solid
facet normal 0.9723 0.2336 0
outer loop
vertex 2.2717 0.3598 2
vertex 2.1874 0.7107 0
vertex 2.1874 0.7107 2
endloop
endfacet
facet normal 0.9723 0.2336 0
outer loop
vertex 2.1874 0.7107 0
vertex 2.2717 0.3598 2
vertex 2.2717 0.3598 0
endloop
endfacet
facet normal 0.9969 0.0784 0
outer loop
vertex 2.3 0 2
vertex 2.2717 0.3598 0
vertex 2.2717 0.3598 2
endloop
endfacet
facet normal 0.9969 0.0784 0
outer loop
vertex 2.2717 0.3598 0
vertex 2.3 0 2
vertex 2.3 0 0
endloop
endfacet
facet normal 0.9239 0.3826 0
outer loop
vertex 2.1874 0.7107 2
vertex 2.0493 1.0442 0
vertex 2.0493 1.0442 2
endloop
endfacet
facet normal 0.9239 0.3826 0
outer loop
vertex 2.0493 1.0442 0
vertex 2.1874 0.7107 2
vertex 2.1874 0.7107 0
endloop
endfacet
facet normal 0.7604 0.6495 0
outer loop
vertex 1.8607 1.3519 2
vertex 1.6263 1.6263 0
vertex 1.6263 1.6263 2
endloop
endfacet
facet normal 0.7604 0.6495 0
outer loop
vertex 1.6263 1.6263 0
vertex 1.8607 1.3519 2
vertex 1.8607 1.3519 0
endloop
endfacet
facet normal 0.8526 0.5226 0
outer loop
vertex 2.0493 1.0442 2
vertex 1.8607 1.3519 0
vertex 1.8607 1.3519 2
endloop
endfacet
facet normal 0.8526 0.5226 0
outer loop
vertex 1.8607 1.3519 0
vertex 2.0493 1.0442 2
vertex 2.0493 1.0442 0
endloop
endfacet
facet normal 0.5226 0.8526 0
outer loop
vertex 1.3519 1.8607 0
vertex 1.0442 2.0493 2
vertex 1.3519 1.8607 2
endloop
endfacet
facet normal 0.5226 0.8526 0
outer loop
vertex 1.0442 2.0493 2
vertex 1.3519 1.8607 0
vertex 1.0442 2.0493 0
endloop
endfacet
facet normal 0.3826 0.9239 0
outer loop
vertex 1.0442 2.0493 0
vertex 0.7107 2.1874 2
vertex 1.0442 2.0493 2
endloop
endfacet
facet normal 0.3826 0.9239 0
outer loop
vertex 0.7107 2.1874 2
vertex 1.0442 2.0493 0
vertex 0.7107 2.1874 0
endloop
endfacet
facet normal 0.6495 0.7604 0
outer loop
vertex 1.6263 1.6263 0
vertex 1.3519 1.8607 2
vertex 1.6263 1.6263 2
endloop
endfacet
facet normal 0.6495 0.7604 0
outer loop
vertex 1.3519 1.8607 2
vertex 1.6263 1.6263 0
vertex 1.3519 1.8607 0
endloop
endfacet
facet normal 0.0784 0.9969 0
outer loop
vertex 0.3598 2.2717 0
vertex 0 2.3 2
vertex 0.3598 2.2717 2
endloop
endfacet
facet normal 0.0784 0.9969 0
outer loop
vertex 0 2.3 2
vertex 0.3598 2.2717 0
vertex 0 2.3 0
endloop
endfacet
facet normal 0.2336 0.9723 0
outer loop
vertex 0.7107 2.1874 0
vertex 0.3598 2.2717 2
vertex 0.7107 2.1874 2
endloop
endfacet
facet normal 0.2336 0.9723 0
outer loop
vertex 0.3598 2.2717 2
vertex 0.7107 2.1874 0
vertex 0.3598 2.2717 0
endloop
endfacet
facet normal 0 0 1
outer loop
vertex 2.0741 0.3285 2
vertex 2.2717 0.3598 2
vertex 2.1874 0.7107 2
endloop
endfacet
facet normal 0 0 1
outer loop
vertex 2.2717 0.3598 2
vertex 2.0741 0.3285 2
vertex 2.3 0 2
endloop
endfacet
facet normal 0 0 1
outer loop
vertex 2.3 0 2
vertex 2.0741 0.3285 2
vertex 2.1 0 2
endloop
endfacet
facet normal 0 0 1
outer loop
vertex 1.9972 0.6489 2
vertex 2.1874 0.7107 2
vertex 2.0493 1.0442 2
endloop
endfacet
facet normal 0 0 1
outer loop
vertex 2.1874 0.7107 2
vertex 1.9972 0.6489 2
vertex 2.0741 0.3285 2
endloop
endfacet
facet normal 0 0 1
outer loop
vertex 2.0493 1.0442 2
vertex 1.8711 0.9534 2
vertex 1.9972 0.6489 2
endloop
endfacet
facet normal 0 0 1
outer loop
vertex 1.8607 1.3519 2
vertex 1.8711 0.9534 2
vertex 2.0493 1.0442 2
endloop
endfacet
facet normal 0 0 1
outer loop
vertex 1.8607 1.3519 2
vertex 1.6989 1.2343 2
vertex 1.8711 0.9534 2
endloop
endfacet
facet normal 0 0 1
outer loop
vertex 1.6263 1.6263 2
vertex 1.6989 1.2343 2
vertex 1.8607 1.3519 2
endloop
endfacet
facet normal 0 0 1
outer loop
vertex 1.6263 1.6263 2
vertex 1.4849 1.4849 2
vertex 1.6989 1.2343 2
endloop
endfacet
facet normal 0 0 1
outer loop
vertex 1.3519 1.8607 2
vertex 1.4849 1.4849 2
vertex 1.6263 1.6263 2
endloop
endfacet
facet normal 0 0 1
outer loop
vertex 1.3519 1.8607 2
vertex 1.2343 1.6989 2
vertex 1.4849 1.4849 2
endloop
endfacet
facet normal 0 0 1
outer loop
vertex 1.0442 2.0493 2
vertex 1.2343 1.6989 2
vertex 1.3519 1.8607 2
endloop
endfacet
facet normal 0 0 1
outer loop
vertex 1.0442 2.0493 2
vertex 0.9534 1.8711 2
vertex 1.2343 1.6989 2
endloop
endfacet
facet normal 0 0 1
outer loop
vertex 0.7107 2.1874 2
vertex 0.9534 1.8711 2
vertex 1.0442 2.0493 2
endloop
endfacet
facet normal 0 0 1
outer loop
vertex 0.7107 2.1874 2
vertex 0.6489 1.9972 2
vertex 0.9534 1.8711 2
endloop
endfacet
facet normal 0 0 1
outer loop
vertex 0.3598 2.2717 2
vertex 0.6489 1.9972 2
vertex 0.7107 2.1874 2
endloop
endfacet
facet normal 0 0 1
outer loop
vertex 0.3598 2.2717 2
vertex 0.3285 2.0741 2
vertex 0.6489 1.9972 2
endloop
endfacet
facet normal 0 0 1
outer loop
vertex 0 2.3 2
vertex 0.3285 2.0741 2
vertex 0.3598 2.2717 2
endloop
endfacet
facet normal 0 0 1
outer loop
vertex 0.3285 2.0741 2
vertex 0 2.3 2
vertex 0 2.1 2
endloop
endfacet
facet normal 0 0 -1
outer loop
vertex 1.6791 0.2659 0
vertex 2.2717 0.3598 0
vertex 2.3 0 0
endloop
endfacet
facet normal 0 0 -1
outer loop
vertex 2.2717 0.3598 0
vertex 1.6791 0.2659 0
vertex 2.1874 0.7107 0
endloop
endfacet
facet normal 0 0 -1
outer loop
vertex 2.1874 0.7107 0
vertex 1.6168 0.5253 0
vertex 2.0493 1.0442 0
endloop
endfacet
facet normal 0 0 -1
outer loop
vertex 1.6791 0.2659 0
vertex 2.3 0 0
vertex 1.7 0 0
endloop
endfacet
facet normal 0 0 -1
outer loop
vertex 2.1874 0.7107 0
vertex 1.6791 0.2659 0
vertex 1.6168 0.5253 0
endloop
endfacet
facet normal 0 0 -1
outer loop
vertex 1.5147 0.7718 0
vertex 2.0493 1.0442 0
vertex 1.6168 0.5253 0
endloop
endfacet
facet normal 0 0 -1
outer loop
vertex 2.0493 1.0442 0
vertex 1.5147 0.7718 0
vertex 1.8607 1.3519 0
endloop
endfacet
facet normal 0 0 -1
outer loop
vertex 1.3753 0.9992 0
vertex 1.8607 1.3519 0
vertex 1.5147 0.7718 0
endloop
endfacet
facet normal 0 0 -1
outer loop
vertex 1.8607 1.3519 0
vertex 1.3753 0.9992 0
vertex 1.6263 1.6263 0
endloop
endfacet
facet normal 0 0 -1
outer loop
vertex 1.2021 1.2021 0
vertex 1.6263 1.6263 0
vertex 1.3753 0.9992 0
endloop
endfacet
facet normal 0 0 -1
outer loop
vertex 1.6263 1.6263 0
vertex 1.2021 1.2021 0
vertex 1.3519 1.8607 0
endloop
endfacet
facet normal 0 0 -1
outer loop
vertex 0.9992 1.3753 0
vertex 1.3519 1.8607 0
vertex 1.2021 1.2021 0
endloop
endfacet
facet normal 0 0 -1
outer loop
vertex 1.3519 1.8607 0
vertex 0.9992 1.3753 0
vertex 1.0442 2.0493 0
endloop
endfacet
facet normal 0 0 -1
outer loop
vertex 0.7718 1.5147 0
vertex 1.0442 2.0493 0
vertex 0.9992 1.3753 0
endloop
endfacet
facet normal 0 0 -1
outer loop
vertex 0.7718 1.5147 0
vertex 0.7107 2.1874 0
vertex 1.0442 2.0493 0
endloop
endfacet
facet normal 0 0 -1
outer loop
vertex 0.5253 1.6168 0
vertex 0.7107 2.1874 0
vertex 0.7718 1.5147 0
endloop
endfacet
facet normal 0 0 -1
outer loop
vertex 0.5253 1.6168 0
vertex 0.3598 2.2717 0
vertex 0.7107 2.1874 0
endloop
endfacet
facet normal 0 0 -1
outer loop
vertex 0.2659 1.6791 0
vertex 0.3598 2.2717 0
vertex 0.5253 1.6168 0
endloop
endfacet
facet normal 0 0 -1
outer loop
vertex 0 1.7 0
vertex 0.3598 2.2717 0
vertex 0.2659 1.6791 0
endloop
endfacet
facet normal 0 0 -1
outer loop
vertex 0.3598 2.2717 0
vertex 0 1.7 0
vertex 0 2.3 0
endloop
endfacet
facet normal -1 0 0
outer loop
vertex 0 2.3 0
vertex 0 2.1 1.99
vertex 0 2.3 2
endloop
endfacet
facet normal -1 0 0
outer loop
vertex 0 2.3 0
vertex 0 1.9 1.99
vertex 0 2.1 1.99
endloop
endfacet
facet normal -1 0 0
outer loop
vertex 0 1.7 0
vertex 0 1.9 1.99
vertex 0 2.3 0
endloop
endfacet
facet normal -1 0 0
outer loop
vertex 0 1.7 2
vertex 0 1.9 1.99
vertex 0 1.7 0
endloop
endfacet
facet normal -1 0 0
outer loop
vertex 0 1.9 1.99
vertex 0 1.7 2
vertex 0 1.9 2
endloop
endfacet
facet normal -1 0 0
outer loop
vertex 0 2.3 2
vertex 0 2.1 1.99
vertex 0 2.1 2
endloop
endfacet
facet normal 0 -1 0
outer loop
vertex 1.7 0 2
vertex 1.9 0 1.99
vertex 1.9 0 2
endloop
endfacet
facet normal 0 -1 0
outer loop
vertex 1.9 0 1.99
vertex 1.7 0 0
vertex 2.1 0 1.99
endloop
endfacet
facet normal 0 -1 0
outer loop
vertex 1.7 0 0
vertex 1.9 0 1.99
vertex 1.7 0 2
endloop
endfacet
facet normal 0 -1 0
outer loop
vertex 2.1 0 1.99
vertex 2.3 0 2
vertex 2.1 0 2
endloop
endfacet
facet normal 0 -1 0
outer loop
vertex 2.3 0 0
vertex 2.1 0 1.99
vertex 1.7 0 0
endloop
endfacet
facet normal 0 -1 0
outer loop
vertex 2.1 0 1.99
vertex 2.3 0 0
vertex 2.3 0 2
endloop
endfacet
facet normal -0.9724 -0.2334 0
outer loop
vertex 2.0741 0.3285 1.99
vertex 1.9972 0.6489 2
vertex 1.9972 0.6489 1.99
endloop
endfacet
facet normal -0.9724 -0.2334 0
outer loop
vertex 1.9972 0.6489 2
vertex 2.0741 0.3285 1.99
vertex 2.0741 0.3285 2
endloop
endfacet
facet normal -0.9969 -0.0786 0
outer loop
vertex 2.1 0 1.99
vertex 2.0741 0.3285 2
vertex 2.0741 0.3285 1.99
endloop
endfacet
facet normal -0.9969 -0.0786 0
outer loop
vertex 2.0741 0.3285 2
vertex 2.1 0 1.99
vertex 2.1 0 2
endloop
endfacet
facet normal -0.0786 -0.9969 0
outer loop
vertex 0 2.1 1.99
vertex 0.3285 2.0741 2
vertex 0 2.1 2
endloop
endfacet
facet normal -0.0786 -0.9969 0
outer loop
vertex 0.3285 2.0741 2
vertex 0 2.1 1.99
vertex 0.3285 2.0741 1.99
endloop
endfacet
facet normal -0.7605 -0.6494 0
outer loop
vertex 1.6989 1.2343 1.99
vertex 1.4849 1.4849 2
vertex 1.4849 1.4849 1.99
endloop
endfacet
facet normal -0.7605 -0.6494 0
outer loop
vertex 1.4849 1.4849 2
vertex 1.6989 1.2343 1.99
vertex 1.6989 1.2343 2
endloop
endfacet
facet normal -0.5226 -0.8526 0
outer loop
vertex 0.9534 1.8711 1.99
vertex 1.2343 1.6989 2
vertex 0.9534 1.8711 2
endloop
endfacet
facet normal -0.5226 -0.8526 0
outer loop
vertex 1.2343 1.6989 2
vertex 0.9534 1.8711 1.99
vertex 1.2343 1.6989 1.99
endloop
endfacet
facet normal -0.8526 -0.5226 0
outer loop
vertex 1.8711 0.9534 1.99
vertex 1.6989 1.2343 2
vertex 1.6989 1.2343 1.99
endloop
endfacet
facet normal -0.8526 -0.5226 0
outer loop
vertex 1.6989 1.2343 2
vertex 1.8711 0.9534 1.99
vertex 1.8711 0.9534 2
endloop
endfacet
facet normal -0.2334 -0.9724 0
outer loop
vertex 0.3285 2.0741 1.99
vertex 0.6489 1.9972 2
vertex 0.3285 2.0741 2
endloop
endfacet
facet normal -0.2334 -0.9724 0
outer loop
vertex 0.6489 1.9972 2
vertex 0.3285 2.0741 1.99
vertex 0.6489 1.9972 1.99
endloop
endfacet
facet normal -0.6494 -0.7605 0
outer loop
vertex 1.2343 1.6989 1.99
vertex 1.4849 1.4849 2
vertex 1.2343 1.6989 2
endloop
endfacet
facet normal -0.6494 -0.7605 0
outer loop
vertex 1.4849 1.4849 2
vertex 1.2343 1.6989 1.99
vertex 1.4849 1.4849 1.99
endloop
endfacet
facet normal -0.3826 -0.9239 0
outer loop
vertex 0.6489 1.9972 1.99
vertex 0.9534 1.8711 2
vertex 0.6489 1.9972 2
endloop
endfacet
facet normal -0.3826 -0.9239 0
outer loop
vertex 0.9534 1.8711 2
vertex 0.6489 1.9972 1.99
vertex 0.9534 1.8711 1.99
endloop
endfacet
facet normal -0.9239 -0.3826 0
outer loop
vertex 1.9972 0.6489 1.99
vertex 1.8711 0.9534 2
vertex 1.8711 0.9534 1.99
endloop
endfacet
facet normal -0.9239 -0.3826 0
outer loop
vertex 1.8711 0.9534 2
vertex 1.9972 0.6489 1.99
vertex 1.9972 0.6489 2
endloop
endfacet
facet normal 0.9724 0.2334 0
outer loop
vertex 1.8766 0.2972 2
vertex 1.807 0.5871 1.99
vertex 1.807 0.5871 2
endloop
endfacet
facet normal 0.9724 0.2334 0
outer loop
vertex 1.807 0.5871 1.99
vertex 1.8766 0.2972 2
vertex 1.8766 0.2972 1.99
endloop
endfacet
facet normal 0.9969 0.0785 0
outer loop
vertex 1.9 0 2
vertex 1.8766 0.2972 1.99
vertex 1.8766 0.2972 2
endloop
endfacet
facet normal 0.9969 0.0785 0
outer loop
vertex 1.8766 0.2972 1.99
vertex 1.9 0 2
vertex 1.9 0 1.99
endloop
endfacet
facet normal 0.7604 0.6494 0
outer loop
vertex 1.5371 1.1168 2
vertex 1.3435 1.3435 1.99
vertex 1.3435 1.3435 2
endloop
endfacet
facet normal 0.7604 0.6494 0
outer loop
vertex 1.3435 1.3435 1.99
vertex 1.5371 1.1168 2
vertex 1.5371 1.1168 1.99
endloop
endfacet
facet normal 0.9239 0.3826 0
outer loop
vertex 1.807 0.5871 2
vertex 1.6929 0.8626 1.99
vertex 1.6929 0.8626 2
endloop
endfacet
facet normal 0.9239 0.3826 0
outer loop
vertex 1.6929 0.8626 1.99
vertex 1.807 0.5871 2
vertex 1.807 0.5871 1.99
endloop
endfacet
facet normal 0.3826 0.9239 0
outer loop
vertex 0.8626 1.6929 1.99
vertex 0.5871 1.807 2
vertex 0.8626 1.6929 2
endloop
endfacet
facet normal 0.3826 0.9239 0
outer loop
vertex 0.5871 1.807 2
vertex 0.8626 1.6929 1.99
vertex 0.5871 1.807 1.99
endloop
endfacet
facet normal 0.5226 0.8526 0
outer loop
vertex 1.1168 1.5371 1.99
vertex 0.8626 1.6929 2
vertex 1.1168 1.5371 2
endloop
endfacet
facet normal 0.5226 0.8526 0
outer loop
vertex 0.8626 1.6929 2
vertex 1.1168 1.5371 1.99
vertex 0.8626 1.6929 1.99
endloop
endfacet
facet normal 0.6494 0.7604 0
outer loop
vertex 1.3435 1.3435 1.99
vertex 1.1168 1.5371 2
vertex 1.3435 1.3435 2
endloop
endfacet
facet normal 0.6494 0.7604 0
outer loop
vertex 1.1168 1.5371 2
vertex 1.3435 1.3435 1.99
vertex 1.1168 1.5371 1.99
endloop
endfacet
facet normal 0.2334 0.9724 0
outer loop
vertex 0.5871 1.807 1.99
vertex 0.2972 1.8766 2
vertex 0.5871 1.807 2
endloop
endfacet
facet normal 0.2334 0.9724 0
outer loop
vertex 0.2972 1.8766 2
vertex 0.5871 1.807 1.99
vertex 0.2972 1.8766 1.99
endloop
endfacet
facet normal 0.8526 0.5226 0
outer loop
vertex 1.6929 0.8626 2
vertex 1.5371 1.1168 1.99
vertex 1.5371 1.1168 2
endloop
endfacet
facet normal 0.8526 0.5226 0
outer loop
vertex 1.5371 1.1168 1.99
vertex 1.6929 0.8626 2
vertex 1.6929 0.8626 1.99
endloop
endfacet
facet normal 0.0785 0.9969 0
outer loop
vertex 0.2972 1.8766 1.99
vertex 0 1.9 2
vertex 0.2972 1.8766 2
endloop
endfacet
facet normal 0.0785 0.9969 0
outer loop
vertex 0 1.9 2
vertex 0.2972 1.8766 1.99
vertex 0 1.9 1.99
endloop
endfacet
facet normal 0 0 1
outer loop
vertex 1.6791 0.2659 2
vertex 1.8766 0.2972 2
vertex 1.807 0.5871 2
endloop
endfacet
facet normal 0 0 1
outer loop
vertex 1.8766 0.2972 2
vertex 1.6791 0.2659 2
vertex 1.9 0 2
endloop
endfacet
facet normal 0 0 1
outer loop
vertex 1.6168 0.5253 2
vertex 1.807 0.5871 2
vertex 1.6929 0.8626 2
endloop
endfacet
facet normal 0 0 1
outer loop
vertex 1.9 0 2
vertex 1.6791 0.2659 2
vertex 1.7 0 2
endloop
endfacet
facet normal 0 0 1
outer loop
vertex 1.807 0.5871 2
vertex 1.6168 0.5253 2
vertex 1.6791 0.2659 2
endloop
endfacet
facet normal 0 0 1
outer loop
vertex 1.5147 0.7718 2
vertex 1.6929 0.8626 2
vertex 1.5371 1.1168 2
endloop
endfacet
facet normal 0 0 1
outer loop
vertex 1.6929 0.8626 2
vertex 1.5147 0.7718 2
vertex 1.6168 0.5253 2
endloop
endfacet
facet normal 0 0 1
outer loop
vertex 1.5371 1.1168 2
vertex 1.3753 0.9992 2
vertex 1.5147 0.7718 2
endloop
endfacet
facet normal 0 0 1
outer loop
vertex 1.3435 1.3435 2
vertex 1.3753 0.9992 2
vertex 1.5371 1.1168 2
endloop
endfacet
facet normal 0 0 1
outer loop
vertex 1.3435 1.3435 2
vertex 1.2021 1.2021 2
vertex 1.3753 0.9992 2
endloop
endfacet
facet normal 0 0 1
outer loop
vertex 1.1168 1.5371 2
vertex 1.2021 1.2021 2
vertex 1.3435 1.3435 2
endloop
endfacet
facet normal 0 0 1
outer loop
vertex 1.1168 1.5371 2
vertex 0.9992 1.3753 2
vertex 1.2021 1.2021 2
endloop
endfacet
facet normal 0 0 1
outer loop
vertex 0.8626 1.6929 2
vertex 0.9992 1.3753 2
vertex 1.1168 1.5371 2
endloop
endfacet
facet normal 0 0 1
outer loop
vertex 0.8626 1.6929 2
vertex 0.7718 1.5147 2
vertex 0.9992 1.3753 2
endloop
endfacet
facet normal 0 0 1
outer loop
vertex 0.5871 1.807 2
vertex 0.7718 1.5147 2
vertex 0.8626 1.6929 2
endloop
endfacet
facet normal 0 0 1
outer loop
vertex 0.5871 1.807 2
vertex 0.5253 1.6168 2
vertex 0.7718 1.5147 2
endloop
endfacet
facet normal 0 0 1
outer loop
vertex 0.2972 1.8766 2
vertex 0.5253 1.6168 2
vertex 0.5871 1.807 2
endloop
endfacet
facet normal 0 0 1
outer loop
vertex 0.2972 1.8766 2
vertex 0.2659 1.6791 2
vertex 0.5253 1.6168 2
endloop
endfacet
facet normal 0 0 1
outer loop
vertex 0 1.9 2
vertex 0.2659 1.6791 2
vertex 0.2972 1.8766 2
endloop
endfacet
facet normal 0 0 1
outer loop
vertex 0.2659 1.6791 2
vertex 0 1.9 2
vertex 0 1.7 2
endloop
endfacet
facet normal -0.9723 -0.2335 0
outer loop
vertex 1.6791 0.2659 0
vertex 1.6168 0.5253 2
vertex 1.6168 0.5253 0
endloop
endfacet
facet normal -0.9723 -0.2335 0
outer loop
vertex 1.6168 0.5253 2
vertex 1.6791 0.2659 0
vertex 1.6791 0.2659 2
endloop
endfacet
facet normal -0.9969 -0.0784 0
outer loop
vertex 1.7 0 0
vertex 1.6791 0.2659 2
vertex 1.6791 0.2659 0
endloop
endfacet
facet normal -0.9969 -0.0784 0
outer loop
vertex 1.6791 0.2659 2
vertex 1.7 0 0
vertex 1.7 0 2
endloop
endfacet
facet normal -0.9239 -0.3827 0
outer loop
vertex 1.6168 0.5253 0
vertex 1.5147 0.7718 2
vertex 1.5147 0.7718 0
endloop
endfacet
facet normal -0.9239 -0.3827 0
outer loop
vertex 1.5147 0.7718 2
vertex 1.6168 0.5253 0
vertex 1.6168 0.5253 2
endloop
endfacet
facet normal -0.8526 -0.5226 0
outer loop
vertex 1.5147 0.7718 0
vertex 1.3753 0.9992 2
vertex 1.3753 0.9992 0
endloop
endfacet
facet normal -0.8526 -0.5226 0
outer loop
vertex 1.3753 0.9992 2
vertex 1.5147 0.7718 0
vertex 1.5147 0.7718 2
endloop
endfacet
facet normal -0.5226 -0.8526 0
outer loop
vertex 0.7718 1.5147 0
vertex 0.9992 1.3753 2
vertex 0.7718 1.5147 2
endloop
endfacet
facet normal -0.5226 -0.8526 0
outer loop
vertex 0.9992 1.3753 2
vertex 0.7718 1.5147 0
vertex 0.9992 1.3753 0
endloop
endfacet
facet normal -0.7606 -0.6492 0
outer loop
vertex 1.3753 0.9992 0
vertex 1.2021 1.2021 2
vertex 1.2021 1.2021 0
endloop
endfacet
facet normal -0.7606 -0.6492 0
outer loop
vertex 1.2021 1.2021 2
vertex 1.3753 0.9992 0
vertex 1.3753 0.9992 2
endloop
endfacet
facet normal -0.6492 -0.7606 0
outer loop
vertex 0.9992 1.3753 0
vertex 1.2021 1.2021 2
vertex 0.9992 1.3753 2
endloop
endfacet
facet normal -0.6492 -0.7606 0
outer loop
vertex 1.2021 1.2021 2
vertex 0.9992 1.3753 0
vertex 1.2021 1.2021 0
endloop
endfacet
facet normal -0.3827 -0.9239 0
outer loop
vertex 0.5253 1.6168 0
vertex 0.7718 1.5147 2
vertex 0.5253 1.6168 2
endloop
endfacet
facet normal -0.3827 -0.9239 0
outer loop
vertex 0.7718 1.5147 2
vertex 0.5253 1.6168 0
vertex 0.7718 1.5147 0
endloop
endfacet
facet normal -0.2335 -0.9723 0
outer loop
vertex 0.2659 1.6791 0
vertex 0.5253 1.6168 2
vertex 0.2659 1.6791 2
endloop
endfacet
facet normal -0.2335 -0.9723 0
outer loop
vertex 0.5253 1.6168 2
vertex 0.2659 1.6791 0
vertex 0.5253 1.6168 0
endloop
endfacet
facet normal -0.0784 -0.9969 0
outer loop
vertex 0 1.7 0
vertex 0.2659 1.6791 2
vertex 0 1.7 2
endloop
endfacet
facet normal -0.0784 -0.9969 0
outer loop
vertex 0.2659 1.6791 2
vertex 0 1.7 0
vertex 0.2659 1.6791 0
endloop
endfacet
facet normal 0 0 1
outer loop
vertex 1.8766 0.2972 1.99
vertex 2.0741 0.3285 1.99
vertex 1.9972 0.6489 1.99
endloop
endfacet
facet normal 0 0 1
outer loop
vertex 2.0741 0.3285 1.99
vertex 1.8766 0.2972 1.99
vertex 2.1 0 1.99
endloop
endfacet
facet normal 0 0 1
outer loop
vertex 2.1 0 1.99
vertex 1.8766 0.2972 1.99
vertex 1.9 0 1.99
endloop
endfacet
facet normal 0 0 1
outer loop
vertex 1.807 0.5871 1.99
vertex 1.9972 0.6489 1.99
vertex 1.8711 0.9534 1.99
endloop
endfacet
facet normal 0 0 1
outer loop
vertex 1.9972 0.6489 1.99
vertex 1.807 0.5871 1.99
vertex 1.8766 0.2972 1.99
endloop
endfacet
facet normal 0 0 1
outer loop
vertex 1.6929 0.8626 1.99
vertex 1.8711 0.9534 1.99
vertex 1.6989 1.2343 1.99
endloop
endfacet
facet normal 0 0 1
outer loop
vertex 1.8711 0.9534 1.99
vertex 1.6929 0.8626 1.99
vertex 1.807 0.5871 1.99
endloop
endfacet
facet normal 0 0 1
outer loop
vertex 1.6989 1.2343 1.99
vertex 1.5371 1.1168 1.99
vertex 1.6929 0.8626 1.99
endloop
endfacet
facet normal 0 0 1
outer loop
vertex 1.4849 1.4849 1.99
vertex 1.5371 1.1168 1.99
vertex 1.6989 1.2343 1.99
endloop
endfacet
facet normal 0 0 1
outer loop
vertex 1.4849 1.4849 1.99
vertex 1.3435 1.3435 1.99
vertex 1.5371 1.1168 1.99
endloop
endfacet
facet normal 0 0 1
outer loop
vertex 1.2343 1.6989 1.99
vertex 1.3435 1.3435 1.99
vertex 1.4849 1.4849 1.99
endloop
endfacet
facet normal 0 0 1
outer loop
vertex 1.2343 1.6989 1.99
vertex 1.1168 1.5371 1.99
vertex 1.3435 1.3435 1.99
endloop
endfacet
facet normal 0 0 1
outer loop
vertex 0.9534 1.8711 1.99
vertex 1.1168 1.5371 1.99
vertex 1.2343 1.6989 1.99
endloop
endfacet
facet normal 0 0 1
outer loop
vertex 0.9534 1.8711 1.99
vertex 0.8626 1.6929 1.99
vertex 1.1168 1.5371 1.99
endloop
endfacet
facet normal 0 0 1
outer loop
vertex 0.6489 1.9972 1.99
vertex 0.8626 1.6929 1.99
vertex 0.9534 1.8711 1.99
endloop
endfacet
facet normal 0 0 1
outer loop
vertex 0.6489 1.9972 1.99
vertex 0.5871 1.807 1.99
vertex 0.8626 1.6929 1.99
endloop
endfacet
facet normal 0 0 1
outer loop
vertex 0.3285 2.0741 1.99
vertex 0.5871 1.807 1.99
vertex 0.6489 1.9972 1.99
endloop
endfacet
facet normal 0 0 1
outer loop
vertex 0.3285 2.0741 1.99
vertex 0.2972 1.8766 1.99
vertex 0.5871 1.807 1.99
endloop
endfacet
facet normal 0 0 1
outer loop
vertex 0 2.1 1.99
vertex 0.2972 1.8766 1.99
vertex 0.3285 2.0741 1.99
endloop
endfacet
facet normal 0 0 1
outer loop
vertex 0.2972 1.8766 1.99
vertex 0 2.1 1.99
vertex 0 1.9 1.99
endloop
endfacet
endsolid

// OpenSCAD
module Wall_03(rot = 0){

    module Wall_Curve(){
        rotate([0,0,rot * 90]){
        color("white")
        translate([0,0,0])

        difference(){
            intersection(){
                cylinder(3.98,2.1,2.1, $fn=40, center = true);
                cube([3,3,3]);
                }
        
            rotate([0,0,0])
            cylinder(5,1.9,1.9, center= true, $fn=40);
            }
            }

        }
                
        rotate([0,0,rot * 90]){
        color("blue")
        translate([0,0,0])

        difference(){
            intersection(){
                cylinder(4,2.3,2.3, $fn=40, center = true);
                cube([3,3,3]);
            }
        
            rotate([0,0,0])
            cylinder(5,2.1,2.1, center= true, $fn=40);
            }
        }
       
        
        rotate([0,0,rot * 90]){
        color("green")
        translate([0,0,0])

        difference(){
            intersection(){
                cylinder(4,1.9,1.9, $fn=40, center = true);
                cube([4,3,3]);
            }
        
            rotate([0,0,0])
            cylinder(6,1.7,1.7, center= true, $fn=40);
        }
    }
         
    Wall_Curve();
}


Wall_03(rot =0);

// Written by Nicolì Angelo (Gengio) 2024: 
// MIT License

//Permission is hereby granted, free of charge, to any person obtaining a copy of this software and associated documentation files (the "Software"), to deal in the Software without restriction, including without limitation the rights to use, copy, modify, merge, publish, distribute, sublicense, and/or sell copies of the Software, and to permit persons to whom the Software is furnished to do so, subject to the following conditions:

//The above copyright notice and this permission notice shall be included in all copies or substantial portions of the Software.

//THE SOFTWARE IS PROVIDED "AS IS", WITHOUT WARRANTY OF ANY KIND, EXPRESS OR IMPLIED, INCLUDING BUT NOT LIMITED TO THE WARRANTIES OF MERCHANTABILITY, FITNESS FOR A PARTICULAR PURPOSE AND NONINFRINGEMENT. IN NO EVENT SHALL THE AUTHORS OR COPYRIGHT HOLDERS BE LIABLE FOR ANY CLAIM, DAMAGES OR OTHER LIABILITY, WHETHER IN AN ACTION OF CONTRACT, TORT OR OTHERWISE, ARISING FROM, OUT OF OR IN CONNECTION WITH THE SOFTWARE OR THE USE OR OTHER DEALINGS IN THE SOFTWARE.
